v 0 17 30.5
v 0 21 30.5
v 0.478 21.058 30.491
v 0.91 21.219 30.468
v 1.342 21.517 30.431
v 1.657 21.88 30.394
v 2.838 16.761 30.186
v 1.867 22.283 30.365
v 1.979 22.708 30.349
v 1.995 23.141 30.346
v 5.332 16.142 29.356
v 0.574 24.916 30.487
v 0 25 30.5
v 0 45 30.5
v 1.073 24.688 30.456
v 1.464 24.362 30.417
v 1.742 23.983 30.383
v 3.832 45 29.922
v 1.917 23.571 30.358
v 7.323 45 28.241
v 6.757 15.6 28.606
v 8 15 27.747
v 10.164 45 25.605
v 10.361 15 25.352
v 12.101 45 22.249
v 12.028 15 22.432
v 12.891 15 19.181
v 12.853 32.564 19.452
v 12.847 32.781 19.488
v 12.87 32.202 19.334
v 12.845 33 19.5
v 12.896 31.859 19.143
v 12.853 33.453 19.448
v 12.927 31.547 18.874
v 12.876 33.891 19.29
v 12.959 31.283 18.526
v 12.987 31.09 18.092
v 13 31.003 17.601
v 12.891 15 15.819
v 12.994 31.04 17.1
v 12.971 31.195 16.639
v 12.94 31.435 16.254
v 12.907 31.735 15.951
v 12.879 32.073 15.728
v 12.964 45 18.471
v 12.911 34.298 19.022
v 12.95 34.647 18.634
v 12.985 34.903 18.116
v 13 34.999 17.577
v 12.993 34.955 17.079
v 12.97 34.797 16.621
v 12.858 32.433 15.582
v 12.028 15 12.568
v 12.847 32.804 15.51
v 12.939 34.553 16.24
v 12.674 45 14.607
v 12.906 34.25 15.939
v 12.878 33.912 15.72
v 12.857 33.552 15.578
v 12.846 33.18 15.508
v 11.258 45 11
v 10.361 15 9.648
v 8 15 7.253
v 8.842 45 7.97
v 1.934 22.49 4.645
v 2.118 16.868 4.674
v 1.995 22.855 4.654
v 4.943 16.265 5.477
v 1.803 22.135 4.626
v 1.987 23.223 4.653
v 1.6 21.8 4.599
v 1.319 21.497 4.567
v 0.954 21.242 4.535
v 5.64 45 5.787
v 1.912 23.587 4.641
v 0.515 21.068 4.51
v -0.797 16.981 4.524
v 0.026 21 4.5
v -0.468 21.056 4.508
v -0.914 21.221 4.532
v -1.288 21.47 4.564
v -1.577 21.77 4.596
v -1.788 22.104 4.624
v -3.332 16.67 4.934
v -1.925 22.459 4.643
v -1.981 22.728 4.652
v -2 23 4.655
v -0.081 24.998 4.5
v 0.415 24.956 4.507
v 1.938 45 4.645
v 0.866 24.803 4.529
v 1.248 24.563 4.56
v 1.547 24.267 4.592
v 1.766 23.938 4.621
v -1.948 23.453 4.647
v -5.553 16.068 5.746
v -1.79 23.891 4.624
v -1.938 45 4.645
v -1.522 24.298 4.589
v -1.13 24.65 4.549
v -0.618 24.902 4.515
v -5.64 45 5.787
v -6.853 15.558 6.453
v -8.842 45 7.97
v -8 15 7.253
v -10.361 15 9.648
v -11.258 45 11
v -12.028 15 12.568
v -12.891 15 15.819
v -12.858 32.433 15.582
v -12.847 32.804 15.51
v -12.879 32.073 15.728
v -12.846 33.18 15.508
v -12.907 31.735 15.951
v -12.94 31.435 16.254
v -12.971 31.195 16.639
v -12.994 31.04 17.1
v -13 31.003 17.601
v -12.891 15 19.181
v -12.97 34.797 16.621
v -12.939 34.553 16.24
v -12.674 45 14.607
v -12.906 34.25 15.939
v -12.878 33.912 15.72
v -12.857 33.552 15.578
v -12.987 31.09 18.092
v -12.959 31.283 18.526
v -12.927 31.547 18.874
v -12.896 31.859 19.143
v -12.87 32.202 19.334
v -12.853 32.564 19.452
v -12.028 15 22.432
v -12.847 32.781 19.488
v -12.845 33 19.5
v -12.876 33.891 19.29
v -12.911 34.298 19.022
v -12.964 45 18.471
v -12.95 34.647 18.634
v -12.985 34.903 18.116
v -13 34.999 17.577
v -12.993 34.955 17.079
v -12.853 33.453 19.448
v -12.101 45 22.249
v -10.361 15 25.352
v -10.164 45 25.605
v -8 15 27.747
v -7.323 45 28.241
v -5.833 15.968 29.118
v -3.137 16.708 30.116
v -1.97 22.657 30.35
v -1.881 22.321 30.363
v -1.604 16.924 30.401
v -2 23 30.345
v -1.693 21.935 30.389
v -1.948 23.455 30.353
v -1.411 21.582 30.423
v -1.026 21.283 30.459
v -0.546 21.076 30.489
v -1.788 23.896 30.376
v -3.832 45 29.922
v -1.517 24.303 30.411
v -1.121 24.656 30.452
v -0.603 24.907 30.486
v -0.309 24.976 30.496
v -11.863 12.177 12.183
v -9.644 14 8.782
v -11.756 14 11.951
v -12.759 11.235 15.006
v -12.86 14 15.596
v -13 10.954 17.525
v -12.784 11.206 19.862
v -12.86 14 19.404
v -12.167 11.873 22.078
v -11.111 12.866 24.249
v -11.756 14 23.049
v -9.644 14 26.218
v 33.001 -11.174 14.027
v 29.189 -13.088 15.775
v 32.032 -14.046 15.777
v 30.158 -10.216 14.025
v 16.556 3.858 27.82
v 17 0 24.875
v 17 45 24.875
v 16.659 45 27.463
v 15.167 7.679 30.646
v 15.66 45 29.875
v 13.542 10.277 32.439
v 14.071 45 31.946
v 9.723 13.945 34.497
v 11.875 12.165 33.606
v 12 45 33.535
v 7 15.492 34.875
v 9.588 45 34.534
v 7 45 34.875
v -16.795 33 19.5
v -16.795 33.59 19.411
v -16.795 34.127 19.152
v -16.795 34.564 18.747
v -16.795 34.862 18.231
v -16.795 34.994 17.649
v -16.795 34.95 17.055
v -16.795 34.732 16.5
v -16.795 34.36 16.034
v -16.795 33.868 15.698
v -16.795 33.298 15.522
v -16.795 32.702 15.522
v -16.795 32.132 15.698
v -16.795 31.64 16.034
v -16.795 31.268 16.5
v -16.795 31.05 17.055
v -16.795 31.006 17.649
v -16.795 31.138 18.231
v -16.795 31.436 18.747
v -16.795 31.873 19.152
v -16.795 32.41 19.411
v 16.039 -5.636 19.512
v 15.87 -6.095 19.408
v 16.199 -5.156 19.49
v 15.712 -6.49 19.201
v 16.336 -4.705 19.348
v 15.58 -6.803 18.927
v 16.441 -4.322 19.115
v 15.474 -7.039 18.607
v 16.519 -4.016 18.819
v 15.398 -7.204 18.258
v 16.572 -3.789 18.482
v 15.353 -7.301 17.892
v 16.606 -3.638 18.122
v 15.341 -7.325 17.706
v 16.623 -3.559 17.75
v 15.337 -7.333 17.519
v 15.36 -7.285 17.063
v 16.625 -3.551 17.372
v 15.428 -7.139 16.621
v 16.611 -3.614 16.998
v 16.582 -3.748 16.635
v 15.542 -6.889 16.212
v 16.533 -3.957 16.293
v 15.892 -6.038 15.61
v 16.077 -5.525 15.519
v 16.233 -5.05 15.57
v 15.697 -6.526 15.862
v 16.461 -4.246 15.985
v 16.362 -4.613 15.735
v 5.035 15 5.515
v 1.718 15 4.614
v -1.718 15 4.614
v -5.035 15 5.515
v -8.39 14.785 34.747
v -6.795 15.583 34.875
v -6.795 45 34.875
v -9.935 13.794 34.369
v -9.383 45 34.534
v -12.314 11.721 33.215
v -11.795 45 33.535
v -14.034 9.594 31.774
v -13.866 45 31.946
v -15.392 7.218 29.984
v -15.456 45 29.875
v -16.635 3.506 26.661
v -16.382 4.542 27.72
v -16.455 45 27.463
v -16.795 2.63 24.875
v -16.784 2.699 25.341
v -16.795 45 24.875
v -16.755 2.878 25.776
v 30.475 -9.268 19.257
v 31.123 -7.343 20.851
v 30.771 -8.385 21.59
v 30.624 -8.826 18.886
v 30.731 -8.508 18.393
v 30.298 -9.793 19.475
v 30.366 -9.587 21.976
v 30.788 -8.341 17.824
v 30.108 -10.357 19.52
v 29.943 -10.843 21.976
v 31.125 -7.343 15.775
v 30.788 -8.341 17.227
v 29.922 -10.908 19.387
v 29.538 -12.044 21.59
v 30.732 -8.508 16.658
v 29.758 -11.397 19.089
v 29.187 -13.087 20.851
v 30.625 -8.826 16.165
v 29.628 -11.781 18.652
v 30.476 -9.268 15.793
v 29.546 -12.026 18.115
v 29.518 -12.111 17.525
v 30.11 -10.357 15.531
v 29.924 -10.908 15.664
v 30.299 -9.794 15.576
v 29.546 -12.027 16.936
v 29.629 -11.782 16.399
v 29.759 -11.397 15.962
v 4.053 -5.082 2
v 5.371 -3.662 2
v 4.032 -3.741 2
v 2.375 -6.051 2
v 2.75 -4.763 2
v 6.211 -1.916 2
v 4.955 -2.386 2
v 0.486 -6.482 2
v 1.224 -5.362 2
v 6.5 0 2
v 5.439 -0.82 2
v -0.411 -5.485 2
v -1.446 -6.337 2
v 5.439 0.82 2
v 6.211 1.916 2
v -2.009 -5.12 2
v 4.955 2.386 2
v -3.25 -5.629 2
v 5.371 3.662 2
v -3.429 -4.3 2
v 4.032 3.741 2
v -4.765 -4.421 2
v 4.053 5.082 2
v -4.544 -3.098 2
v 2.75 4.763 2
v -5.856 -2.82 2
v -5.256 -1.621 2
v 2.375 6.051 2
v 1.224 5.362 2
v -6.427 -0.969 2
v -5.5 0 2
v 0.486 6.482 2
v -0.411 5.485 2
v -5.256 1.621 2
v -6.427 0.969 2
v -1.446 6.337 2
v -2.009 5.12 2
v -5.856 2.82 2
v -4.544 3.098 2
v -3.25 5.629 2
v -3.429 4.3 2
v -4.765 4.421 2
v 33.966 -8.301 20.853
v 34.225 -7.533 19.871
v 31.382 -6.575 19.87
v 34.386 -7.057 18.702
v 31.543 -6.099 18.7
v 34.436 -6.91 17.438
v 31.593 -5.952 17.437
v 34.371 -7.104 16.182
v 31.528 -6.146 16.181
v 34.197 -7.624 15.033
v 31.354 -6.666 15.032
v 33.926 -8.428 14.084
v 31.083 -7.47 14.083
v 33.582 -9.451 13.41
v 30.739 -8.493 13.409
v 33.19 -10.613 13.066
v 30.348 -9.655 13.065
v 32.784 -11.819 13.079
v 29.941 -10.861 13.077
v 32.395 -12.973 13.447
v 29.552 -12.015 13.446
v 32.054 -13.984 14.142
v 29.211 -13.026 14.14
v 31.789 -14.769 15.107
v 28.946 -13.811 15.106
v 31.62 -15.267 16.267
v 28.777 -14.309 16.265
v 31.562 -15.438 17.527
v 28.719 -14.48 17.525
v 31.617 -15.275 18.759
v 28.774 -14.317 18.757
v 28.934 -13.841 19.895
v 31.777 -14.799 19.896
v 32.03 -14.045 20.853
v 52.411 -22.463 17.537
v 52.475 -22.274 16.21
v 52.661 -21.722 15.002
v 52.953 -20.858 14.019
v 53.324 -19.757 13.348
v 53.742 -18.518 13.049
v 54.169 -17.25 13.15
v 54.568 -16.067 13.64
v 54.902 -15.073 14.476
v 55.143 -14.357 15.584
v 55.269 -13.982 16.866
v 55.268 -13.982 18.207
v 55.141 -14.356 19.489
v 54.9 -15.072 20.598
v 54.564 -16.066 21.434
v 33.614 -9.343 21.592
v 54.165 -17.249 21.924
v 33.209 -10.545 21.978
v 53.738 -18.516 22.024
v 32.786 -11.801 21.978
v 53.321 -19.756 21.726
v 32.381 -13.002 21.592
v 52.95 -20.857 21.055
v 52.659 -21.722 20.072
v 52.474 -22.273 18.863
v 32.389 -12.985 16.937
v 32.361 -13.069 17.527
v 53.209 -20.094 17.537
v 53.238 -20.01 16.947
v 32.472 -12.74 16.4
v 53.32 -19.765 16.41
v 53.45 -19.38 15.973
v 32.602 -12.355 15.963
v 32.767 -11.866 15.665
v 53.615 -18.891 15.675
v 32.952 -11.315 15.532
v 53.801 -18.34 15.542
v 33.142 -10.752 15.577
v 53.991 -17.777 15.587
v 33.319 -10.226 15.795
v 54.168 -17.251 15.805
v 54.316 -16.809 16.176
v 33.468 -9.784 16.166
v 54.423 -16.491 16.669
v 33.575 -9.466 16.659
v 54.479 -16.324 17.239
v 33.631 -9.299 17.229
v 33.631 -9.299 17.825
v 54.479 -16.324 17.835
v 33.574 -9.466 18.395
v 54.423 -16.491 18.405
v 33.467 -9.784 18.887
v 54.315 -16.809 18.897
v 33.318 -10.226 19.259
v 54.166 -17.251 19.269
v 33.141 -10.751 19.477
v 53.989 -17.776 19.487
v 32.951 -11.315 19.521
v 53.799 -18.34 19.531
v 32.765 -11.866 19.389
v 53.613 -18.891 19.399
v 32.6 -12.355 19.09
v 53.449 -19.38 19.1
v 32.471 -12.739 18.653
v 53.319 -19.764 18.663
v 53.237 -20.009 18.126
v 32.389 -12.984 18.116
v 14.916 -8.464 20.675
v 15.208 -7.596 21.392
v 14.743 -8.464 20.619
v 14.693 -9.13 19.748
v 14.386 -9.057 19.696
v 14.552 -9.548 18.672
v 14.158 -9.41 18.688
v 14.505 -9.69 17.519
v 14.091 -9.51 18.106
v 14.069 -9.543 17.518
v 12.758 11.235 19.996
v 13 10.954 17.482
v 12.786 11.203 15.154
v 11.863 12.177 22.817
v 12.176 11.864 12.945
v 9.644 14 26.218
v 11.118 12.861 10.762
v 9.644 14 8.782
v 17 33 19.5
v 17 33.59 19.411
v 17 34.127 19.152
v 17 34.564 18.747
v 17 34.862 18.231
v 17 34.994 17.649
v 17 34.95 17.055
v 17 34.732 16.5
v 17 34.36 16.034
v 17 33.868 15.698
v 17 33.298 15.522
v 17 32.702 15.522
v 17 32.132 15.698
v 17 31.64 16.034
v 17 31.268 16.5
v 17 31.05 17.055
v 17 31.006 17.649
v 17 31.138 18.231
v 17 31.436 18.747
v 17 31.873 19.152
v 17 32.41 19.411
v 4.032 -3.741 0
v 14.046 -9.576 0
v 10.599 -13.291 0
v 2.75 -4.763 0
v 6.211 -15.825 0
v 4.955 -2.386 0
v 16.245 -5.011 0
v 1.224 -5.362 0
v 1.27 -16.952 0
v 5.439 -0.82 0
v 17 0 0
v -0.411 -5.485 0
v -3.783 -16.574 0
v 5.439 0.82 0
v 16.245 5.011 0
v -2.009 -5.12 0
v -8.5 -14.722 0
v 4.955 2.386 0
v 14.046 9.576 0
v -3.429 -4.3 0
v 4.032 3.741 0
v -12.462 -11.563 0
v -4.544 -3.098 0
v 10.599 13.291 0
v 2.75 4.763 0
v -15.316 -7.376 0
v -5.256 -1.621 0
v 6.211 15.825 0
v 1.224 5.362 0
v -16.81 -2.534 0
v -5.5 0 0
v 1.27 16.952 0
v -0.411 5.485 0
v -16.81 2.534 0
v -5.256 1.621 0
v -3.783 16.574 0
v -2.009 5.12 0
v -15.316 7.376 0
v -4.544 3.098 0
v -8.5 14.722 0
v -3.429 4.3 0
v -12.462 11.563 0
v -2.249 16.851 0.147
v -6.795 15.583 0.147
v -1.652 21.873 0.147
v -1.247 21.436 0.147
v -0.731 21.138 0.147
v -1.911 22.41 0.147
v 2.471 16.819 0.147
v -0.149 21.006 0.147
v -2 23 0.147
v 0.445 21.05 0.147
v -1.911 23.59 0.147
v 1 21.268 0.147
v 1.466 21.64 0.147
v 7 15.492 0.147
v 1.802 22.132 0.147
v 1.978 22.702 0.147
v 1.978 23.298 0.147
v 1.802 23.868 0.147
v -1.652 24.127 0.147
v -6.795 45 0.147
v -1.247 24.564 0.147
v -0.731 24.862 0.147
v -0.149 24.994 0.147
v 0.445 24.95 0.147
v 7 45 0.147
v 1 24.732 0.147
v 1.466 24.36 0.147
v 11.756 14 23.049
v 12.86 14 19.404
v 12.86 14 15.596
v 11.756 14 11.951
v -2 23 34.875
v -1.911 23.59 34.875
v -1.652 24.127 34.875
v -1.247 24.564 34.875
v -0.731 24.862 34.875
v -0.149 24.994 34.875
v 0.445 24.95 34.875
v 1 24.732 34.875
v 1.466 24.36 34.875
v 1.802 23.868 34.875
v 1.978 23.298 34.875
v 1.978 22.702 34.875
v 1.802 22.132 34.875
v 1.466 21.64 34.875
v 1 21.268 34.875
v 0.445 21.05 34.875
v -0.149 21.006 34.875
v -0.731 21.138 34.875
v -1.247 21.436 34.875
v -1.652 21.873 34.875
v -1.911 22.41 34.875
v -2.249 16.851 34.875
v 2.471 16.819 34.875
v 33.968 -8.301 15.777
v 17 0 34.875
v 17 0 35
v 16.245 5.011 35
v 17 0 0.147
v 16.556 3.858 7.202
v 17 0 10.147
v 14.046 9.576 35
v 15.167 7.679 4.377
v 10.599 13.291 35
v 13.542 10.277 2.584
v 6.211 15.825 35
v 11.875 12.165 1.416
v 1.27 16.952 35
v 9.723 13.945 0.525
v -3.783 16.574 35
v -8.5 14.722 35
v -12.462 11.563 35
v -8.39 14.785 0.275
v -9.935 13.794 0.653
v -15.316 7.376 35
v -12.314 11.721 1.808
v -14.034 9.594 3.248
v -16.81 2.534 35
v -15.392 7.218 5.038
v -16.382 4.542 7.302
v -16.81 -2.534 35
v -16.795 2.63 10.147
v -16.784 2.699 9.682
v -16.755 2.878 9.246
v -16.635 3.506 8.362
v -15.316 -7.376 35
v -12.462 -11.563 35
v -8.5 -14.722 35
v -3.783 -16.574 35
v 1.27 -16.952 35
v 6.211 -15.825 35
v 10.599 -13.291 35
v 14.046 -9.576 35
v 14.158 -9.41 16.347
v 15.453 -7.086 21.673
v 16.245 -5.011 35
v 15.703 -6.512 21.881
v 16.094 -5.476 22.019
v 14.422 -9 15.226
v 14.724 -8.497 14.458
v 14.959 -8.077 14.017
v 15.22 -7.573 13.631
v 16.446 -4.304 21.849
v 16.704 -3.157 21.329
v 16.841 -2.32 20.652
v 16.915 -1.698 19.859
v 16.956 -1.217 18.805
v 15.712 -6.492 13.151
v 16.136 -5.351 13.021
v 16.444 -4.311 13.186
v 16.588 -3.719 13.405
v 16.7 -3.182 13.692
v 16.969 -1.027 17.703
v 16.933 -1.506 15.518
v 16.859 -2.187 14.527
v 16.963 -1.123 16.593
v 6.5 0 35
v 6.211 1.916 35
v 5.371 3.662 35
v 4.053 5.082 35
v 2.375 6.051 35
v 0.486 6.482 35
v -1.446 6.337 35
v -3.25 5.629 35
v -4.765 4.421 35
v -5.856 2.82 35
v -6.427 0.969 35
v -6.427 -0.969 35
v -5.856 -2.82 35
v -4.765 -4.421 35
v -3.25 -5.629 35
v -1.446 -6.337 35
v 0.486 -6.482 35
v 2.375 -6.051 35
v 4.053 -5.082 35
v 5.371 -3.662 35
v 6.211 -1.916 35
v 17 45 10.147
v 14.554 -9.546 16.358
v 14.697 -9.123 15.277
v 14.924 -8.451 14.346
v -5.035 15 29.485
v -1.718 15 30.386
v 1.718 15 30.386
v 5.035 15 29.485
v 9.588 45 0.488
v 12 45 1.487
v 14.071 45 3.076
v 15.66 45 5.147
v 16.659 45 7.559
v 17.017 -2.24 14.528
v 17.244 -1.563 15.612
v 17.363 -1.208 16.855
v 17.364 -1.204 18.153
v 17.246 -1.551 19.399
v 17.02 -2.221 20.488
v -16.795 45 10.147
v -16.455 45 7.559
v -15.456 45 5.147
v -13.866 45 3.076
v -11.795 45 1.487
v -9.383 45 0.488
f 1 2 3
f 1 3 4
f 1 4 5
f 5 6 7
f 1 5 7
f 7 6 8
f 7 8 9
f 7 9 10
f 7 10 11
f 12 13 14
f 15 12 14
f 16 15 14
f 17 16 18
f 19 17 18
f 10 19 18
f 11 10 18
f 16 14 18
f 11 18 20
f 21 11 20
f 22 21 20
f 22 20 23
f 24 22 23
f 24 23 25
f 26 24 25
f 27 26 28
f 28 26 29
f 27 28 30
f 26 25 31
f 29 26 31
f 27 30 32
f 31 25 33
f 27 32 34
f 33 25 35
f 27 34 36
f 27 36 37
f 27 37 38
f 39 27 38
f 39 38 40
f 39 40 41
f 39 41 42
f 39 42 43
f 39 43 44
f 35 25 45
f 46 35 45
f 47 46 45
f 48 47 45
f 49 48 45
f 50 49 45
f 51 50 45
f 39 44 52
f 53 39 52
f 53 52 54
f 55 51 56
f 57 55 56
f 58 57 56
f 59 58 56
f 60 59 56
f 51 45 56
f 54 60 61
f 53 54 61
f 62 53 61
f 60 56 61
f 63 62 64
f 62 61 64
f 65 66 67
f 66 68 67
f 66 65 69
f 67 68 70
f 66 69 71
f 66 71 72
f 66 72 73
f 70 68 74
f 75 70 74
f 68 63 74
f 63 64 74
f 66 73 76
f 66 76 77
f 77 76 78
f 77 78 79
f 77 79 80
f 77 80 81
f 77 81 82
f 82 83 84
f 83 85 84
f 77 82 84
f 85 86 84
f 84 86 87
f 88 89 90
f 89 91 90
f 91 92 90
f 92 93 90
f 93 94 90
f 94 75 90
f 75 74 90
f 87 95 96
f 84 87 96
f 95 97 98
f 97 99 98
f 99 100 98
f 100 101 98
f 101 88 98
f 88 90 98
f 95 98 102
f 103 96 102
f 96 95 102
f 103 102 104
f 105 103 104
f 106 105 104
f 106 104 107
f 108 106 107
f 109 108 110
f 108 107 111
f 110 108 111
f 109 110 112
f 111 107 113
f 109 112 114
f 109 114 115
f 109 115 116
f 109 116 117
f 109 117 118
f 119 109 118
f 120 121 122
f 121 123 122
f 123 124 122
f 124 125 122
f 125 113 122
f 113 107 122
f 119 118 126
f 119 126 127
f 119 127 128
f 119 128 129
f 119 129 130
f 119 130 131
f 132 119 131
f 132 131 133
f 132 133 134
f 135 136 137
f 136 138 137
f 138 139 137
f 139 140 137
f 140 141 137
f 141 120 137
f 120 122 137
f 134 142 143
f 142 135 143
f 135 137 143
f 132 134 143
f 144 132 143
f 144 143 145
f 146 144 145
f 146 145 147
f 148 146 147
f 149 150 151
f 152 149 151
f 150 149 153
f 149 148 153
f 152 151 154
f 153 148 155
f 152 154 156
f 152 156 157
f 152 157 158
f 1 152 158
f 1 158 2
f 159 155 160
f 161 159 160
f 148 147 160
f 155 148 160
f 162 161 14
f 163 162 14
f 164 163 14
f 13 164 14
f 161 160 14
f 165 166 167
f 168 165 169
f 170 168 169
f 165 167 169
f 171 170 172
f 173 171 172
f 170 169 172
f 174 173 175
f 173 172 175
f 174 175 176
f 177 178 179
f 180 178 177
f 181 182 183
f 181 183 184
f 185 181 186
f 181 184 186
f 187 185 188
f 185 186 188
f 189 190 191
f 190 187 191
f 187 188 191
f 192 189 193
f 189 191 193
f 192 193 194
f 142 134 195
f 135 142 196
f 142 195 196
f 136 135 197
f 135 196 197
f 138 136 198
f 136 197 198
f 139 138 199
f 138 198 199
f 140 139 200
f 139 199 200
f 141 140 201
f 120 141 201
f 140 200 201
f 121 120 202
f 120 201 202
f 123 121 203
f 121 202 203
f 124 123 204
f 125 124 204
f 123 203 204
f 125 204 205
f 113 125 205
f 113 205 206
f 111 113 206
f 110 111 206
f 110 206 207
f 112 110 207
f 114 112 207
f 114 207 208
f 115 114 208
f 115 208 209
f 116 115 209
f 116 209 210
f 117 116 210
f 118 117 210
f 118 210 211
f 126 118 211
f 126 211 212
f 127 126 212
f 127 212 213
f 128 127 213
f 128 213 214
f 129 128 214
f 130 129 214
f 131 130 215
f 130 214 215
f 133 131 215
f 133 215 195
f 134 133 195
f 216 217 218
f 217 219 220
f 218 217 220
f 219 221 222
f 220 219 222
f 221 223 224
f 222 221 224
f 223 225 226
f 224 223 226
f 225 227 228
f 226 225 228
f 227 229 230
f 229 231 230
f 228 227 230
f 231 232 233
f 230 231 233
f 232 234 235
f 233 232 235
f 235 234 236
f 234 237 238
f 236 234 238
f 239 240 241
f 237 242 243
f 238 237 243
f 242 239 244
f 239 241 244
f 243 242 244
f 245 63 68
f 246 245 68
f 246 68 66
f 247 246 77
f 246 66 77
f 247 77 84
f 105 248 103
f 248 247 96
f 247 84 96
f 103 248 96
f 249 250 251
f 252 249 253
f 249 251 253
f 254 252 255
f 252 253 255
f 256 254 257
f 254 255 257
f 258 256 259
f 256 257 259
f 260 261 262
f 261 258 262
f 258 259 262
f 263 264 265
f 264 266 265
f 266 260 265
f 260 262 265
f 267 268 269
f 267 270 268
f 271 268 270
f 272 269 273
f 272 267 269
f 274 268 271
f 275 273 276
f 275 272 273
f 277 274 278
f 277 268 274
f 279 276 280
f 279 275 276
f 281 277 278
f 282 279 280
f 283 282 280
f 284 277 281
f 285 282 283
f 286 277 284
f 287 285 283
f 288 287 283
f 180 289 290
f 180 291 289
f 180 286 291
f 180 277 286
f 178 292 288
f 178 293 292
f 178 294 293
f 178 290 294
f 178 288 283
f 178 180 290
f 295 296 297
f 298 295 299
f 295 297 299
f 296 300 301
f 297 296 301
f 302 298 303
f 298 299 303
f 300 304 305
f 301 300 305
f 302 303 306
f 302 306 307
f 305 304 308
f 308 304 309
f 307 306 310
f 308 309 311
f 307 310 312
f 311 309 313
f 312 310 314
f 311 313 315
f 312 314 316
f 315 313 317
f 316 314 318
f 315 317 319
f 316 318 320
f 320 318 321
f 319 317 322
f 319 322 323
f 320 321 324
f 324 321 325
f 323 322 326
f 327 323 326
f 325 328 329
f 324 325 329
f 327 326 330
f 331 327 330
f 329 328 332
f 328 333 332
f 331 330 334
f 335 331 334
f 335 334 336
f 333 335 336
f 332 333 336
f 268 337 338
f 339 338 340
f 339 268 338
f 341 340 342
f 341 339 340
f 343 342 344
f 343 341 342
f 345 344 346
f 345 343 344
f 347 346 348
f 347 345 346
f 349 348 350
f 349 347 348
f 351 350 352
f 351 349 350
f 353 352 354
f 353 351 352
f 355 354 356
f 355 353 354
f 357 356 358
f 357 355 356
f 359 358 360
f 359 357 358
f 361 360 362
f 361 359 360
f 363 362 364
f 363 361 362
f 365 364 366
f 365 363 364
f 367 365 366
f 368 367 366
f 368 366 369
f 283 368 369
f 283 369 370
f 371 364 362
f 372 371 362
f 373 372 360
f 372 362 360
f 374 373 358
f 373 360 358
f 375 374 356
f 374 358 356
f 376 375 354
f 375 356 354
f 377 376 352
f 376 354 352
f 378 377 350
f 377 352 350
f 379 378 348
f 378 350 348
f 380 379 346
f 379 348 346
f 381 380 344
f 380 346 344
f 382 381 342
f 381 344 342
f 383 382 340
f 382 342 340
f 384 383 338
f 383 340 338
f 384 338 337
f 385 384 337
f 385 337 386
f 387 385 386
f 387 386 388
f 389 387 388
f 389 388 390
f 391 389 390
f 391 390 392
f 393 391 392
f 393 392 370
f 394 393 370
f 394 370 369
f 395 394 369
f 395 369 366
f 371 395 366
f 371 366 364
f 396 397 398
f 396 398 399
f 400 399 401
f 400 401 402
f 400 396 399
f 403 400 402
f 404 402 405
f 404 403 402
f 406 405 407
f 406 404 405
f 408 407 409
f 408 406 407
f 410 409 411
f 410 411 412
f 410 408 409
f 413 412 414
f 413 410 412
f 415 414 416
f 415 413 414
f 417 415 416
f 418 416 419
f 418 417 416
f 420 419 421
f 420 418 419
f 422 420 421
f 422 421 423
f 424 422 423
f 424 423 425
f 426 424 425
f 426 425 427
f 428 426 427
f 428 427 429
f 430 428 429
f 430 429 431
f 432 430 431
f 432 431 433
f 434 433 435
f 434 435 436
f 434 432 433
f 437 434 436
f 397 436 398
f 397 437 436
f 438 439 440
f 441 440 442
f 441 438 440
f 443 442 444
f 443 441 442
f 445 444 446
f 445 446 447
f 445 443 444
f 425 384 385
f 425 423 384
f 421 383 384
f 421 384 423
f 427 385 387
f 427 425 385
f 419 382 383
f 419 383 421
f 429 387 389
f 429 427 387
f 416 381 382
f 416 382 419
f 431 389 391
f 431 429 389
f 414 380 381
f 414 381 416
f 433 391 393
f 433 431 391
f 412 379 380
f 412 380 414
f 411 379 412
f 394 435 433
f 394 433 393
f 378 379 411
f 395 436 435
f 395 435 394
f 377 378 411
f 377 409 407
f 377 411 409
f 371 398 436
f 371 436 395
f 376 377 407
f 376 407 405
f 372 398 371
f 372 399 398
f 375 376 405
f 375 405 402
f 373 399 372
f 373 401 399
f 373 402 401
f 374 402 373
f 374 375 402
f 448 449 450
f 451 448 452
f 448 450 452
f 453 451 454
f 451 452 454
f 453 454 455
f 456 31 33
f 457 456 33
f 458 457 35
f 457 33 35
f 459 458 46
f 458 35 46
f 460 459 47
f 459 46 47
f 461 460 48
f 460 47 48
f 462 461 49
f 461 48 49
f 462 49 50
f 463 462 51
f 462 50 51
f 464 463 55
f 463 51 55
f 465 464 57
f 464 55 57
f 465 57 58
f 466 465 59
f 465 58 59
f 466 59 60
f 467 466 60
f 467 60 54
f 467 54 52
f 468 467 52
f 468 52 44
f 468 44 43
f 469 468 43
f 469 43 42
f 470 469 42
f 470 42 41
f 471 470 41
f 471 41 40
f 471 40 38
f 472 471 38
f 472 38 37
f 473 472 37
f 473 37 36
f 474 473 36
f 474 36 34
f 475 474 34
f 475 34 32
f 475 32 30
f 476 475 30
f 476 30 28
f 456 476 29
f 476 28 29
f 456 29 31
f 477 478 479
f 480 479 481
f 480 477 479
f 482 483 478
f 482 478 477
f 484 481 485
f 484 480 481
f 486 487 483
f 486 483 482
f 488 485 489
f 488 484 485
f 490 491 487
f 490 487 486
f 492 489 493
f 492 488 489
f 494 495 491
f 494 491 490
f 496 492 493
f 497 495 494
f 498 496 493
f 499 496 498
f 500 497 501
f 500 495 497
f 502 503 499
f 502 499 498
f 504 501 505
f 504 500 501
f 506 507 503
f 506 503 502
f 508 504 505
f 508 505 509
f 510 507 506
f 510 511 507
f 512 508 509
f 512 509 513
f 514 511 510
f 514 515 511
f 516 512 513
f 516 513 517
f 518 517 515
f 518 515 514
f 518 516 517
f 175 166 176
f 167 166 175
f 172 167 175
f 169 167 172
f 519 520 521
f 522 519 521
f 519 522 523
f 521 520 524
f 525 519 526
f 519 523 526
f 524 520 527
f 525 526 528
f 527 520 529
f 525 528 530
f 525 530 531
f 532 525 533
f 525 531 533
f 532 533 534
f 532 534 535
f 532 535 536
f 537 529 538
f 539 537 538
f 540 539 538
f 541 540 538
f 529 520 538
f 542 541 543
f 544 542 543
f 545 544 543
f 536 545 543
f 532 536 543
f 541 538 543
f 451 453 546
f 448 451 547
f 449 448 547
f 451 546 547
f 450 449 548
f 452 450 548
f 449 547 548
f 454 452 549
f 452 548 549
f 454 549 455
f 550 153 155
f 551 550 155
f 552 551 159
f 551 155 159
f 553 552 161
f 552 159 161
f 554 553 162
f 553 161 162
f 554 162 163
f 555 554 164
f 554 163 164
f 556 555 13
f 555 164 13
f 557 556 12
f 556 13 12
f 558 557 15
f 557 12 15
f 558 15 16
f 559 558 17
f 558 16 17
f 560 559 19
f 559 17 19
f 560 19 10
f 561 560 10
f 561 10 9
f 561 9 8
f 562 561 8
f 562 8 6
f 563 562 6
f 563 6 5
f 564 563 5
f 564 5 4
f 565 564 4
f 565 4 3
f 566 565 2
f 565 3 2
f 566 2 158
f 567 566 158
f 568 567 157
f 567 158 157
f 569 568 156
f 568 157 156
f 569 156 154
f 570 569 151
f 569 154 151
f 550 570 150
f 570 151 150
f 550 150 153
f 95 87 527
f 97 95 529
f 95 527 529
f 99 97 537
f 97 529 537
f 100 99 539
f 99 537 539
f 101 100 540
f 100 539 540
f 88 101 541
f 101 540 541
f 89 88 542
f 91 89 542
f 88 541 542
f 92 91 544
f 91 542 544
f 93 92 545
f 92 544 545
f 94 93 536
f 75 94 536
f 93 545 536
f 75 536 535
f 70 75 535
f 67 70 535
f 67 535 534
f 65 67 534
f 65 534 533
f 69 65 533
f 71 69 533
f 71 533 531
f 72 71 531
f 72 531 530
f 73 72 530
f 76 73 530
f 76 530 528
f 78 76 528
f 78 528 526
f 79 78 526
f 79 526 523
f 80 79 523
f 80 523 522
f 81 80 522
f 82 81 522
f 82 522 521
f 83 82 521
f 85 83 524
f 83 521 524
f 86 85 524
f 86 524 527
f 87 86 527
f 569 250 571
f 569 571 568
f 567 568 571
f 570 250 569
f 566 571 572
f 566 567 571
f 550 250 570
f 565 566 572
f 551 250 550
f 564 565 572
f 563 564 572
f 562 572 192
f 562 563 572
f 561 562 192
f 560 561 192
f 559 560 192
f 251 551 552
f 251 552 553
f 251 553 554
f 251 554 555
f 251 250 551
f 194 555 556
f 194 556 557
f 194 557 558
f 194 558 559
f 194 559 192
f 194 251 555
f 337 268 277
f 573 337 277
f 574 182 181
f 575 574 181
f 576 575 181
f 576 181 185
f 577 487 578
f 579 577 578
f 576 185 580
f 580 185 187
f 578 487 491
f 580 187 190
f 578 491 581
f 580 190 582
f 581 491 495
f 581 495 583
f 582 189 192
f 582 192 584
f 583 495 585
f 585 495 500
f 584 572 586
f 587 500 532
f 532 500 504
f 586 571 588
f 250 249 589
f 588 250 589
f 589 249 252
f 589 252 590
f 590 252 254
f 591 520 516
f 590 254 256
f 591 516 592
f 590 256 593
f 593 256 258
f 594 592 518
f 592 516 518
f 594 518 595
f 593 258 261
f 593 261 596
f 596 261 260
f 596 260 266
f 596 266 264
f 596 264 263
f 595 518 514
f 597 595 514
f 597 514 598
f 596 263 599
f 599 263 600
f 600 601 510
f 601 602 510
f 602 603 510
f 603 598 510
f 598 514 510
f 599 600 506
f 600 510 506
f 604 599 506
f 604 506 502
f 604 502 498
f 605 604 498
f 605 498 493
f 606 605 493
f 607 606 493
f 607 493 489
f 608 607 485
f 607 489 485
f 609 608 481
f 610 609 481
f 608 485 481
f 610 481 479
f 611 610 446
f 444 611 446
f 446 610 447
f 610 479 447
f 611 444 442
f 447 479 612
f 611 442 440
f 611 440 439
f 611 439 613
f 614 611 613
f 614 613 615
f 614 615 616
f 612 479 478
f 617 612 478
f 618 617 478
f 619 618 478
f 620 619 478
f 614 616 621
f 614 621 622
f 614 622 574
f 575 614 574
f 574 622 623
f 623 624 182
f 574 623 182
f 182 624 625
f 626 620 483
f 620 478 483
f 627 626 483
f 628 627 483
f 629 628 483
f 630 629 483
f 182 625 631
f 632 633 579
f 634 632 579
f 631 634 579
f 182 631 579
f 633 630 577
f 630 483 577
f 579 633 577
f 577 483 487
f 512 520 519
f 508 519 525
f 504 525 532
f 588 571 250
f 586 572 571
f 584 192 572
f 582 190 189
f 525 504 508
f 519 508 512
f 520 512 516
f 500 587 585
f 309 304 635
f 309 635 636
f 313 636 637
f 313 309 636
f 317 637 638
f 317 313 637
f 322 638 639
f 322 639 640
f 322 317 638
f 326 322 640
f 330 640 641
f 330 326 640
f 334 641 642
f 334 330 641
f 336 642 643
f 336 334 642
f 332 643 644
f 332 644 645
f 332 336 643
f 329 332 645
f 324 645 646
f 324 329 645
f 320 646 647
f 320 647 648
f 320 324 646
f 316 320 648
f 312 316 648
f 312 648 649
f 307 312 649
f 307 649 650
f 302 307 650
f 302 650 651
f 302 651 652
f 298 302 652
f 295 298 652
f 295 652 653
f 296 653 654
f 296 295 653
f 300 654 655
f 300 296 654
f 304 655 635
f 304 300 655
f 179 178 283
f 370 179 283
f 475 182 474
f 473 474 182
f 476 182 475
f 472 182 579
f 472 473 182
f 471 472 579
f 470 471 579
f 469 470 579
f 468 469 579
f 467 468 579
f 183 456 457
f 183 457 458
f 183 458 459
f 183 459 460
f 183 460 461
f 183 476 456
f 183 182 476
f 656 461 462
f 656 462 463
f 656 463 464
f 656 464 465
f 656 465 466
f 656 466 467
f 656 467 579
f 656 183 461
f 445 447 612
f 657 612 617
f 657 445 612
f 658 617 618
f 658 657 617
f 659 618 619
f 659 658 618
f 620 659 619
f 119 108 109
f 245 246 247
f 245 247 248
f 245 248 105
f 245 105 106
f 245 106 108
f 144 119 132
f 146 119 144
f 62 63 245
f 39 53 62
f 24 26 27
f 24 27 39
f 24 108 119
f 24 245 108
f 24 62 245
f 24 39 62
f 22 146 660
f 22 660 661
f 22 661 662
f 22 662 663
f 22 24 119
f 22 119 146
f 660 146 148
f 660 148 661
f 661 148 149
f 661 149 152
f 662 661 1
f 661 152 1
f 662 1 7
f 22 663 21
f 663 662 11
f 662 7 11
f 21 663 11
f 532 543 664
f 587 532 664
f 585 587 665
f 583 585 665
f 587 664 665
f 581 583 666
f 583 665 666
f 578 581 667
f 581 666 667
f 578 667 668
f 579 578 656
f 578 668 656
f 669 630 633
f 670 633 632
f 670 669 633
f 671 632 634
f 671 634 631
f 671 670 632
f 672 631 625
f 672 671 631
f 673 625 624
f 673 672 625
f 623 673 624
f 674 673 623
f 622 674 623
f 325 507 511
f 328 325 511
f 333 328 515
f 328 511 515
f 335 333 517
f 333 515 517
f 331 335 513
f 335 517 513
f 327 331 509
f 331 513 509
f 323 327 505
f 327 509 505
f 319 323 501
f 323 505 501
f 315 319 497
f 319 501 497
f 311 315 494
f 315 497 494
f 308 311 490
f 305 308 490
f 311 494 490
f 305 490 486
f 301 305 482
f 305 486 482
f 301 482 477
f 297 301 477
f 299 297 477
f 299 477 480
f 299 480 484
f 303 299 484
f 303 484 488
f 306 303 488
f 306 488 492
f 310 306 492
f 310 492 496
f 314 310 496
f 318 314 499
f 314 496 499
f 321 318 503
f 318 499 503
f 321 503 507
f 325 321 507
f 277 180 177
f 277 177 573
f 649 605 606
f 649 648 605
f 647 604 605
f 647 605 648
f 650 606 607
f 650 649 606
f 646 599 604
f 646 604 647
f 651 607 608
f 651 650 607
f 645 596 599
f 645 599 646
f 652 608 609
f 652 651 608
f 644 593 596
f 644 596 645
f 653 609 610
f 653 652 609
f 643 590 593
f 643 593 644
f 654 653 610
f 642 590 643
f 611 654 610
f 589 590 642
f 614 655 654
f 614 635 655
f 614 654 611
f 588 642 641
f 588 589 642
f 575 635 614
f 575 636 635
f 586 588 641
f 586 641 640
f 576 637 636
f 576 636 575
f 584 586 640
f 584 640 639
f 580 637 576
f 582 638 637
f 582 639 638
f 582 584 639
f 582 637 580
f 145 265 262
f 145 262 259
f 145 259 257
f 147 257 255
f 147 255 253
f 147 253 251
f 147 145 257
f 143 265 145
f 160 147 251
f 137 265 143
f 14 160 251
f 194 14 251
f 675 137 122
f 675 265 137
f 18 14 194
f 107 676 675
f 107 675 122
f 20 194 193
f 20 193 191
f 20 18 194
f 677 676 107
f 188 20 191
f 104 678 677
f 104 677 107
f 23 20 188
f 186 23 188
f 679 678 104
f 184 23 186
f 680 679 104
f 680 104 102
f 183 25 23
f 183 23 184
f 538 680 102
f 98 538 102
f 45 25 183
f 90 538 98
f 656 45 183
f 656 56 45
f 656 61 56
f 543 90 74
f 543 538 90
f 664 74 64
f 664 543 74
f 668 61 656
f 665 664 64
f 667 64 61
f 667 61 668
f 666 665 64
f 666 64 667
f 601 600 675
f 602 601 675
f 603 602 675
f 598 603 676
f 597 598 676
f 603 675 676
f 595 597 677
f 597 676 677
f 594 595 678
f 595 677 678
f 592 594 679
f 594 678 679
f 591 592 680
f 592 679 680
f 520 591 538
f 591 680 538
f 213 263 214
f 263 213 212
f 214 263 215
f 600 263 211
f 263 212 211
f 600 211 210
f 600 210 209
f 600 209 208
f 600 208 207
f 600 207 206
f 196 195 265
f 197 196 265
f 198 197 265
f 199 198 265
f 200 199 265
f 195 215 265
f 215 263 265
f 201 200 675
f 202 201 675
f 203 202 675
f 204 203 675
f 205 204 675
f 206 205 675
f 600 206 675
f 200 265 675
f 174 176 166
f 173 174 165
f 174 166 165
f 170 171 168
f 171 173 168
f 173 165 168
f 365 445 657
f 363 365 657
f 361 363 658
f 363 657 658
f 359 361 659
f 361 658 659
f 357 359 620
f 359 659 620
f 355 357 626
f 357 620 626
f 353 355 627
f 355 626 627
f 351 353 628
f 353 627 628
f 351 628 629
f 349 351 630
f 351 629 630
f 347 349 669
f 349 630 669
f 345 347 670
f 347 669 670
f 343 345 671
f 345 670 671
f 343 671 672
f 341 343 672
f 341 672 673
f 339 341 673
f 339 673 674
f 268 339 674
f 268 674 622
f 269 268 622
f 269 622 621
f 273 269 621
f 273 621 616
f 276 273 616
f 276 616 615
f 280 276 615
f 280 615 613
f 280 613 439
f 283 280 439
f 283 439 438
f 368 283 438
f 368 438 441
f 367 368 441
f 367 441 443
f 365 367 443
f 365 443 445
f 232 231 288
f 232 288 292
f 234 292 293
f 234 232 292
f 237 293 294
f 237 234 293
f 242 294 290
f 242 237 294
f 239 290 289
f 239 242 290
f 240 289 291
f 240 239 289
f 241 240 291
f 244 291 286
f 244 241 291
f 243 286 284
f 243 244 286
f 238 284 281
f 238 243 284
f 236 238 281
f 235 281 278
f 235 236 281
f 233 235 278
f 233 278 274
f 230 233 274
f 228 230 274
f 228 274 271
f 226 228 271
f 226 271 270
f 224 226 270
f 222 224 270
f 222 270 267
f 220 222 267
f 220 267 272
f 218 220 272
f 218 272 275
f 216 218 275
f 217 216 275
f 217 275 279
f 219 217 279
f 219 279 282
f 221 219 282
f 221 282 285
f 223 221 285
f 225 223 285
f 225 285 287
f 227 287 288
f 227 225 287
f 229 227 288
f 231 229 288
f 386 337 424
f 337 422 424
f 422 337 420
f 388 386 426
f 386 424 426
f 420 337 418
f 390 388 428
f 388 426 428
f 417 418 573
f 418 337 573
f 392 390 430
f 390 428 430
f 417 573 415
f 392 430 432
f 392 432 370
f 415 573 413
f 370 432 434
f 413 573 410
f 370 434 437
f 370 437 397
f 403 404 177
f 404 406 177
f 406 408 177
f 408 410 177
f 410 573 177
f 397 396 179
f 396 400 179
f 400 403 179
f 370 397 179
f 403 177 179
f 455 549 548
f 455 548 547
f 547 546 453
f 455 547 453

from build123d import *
from build123d.topology import SkipClean

# Parameters (mm, degrees)
SKETCH_1_R                        = 17
SKETCH_1_R_2                      = 6.5
EXTRUDE_2_DEPTH                   = 35
SKETCH_3_W                        = 33.795275063
SKETCH_3_H                        = 34.72803434
SKETCH_3_R                        = 13
EXTRUDE_7_DEPTH                   = 45
SKETCH_4_R                        = 6.5
CUT_EXTRUDE_1_DEPTH               = 60.489495005
SKETCH_12_R                       = 2
CUT_EXTRUDE_11_DEPTH              = 45
SKETCH_15_R                       = 2
CUT_EXTRUDE_12_DEPTH              = 45
FILLET_4_R                        = 10
SKETCH_20_R                       = 13
CUT_EXTRUDE_18_DEPTH              = 31
EXTRUDE_START                     = 1
SKETCH_25_R                       = 13
EXTRUDE_10_DEPTH                  = 1
SKETCH_26_R                       = 6.5
SKETCH_26_R_2                     = 5.5
EXTRUDE_11_DEPTH                  = 2
SKETCH_36_R                       = 4.5
SKETCH_36_R_2                     = 2
EXTRUDE_17_DEPTH                  = 15
EXTRUDE_17_DIRECTION_2_REACH      = 71.637
EXTRUDE_17_DIRECTION_2_END_RADIUS = 17
EXTRUDE_18_DEPTH                  = 3
SKETCH_38_R                       = 4.5
SKETCH_38_R_2                     = 2
EXTRUDE_20_DEPTH                  = 22


with BuildPart() as part:
    # Эскиз1 → Бобышка-Вытянуть2 (new body)
    with BuildSketch(Plane.XY):
        Circle(SKETCH_1_R)
        Circle(SKETCH_1_R_2, mode=Mode.SUBTRACT)
    extrude(amount=EXTRUDE_2_DEPTH)

    # Эскиз3 → Бобышка-Вытянуть7 (add)
    with BuildSketch(Plane(origin=(0, 45, 0), x_dir=(1, 0, 0), z_dir=(0, 1, 0))):
        with Locations((0.102362468, -17.511098906)):
            Rectangle(SKETCH_3_W, SKETCH_3_H)
        with Locations(Location((0, -17.5, 0), (0, 0, 270))):
            Circle(SKETCH_3_R, mode=Mode.SUBTRACT)
    extrude(amount=-EXTRUDE_7_DEPTH)

    # Эскиз4 → Вырез-Вытянуть1 (cut, through all)
    with BuildSketch(Plane(origin=(0, 0, 0), x_dir=(-1, 0, 0), z_dir=(0, 0, -1))):
        with Locations(Location((0, 0, 0), (0, 0, 180))):
            Circle(SKETCH_4_R)
    extrude(amount=-CUT_EXTRUDE_1_DEPTH, mode=Mode.SUBTRACT)

    # Эскиз12 → Вырез-Вытянуть11 (cut)
    with BuildSketch(Plane(origin=(0, 0, 0), x_dir=(-1, 0, 0), z_dir=(0, 0, -1))):
        with Locations((0, 23)):
            Circle(SKETCH_12_R)
    extrude(amount=-CUT_EXTRUDE_11_DEPTH, mode=Mode.SUBTRACT)

    # Эскиз15 → Вырез-Вытянуть12 (cut)
    with BuildSketch(Plane.ZY.offset(16.795275063)):
        with Locations((17.5, 33)):
            Circle(SKETCH_15_R)
    extrude(amount=-CUT_EXTRUDE_12_DEPTH, mode=Mode.SUBTRACT)

    # Скругление4
    # the kernel refuses this fillet: 10 mm, written as the material it takes off along each edge
    with BuildSketch(Plane(origin=(-16.795275063, 70, 34.875116076), x_dir=(1, 0, 0), z_dir=(0, -1, 0))) as fillet_4_piece_1_section:
        with BuildLine():
            CenterArc((FILLET_4_R, -FILLET_4_R), FILLET_4_R, 90, 90)
            Line((0, -FILLET_4_R), (0, 0))
            Line((0, 0), (FILLET_4_R, 0))
        make_face()
    fillet_4_piece_1 = extrude(amount=92.369651061, mode=Mode.PRIVATE)
    fillet_4_piece_1 = fillet_4_piece_1 - Plane(origin=(0, 0, 32.54483178), x_dir=(1, 0, 0), z_dir=(0, 0, -1)) * Cylinder(17, 225, mode=Mode.PRIVATE)
    add(fillet_4_piece_1, mode=Mode.SUBTRACT)
    with BuildSketch(Plane(origin=(17, 70, 0.147081736), x_dir=(0, 0, 1), z_dir=(0, -1, 0))) as fillet_4_piece_2_section:
        with BuildLine():
            CenterArc((FILLET_4_R, FILLET_4_R), FILLET_4_R, 180, 90)
            Line((0, FILLET_4_R), (0, 0))
            Line((0, 0), (FILLET_4_R, 0))
        make_face()
    fillet_4_piece_2 = extrude(amount=95, mode=Mode.PRIVATE)
    fillet_4_piece_2 = fillet_4_piece_2 - Plane(origin=(0, 0, 2.486350956), x_dir=(1, 0, 0), z_dir=(0, 0, -1)) * Cylinder(17, 230, mode=Mode.PRIVATE)
    add(fillet_4_piece_2, mode=Mode.SUBTRACT)
    with BuildSketch(Plane(origin=(17, 70, 34.875116076), x_dir=(0, 0, -1), z_dir=(0, -1, 0))) as fillet_4_piece_3_section:
        with BuildLine():
            CenterArc((FILLET_4_R, -FILLET_4_R), FILLET_4_R, 90, 90)
            Line((0, -FILLET_4_R), (0, 0))
            Line((0, 0), (FILLET_4_R, 0))
        make_face()
    fillet_4_piece_3 = extrude(amount=95, mode=Mode.PRIVATE)
    fillet_4_piece_3 = fillet_4_piece_3 - Plane(origin=(0, 0, 32.535846855), x_dir=(1, 0, 0), z_dir=(0, 0, -1)) * Cylinder(17, 230, mode=Mode.PRIVATE)
    add(fillet_4_piece_3, mode=Mode.SUBTRACT)
    with BuildSketch(Plane(origin=(-16.795275063, 70, 0.147081736), x_dir=(0, 0, 1), z_dir=(0, -1, 0))) as fillet_4_piece_4_section:
        with BuildLine():
            CenterArc((FILLET_4_R, -FILLET_4_R), FILLET_4_R, 90, 90)
            Line((0, -FILLET_4_R), (0, 0))
            Line((0, 0), (FILLET_4_R, 0))
        make_face()
    fillet_4_piece_4 = extrude(amount=92.369651061, mode=Mode.PRIVATE)
    fillet_4_piece_4 = fillet_4_piece_4 - Plane(origin=(0, 0, 2.477367304), x_dir=(1, 0, 0), z_dir=(0, 0, -1)) * Cylinder(17, 225, mode=Mode.PRIVATE)
    add(fillet_4_piece_4, mode=Mode.SUBTRACT)

    # Эскиз20 → Вырез-Вытянуть18 (cut)
    with SkipClean():  # the faces are left unmerged after this step: merging them gives an invalid solid
        with BuildSketch(Plane(origin=(0, 45, 0), x_dir=(1, 0, 0), z_dir=(0, 1, 0))):
            with Locations(Location((0, -17.5, 0), (0, 0, 270))):
                Circle(SKETCH_20_R)
        extrude(amount=-CUT_EXTRUDE_18_DEPTH, mode=Mode.SUBTRACT)

    # Эскиз25 → Бобышка-Вытянуть10 (add)
    with BuildSketch(Plane(origin=(0, 14, 0), x_dir=(1, 0, 0), z_dir=(0, 1, 0)).offset(EXTRUDE_START)):
        with Locations(Location((0, -17.5, 0), (0, 0, 270))):
            Circle(SKETCH_25_R)
    extrude(amount=-EXTRUDE_10_DEPTH)

    # Эскиз26 → Бобышка-Вытянуть11 (add)
    with BuildSketch(Plane(origin=(0, 0, 0), x_dir=(-1, 0, 0), z_dir=(0, 0, -1))):
        Circle(SKETCH_26_R)
        Circle(SKETCH_26_R_2, mode=Mode.SUBTRACT)
    extrude(amount=-EXTRUDE_11_DEPTH)

    # Эскиз36 → Бобышка-Вытянуть17 (add)
    with BuildSketch(Plane(origin=(15.965526333, -5.379751182, 0.007630631), x_dir=(0.001361712962568806, 0.0026227730541390965, -0.9999956333901235), z_dir=(0.9476469847760447, -0.31931956893709296, 0.00045292239977668937))):
        with Locations(Location((-17.511098906, 0, 0), (0, 0, 269.832679764))):
            Circle(SKETCH_36_R)
        with Locations(Location((-17.511098906, 0, 0), (0, 0, 269.832679764))):
            Circle(SKETCH_36_R_2, mode=Mode.SUBTRACT)
    extrude(amount=EXTRUDE_17_DEPTH)

    # Бобышка-Вытянуть17 direction 2: up to this cylinder (the profile starts outside it)
    with SkipClean():  # the faces are left unmerged after this step: merging them gives an invalid solid
        extrude_17_direction_2_end = Plane(origin=(0, 0, 17.518653), z_dir=(0, 0, -1)) * Cylinder(EXTRUDE_17_DIRECTION_2_END_RADIUS, 178.274, mode=Mode.PRIVATE)
        # Эскиз36 → Бобышка-Вытянуть17 direction 2 (add, up to the surface)
        with BuildSketch(Plane(origin=(15.965526333, -5.379751182, 0.007630631), x_dir=(0.001361712962568806, 0.0026227730541390965, -0.9999956333901235), z_dir=(0.9476469847760447, -0.31931956893709296, 0.00045292239977668937)), mode=Mode.PRIVATE) as extrude_17_direction_2_sk1:
            with Locations(Location((-17.511098906, 0, 0), (0, 0, 269.832679764))):
                Circle(SKETCH_36_R)
            with Locations(Location((-17.511098906, 0, 0), (0, 0, 269.832679764))):
                Circle(SKETCH_36_R_2, mode=Mode.SUBTRACT)
        extrude_17_direction_2_tool1 = extrude(extrude_17_direction_2_sk1.sketch, amount=-EXTRUDE_17_DIRECTION_2_REACH, mode=Mode.PRIVATE) - extrude_17_direction_2_end
        add(extrude_17_direction_2_tool1.solids().sort_by_distance((17.337977, -1.281883, 17.518653))[0])
        add(extrude_17_direction_2_tool1.solids().sort_by_distance((17.337977, -1.281883, 17.518653))[1])

    # Эскиз37 → Бобышка-Вытянуть18 (add)
    with SkipClean():  # the faces are left unmerged after this step: merging them gives an invalid solid
        with BuildSketch(Plane(origin=(30.180231104, -10.169544716, 0.014424467), x_dir=(0.00042921059050976356, -0.00014462700029294434, -0.9999998974306447), z_dir=(0.9476469847760448, -0.31931956893709273, 0.0004529223997766894))):
            with BuildLine():
                Line((-19.261024238, 2.979951516), (-20.837057911, 2.979951516))
                ThreePointArc((-20.837057911, 2.979951516), (-13.011024238, -0.051137397), (-20.837057911, -3.08222631))
                Line((-20.837057911, -3.08222631), (-19.261024238, -3.08222631))
                Line((-19.261024238, -3.08222631), (-15.761024238, -3.08222631))
                Line((-15.761024238, -3.08222631), (-14.011024238, -0.051137397))
                Line((-14.011024238, -0.051137397), (-15.761024238, 2.979951516))
                Line((-15.761024238, 2.979951516), (-19.261024238, 2.979951516))
            make_face()
        extrude(amount=EXTRUDE_18_DEPTH)

    # Эскиз38 → Бобышка-Вытянуть20 (add)
    with SkipClean():  # the faces are left unmerged after this step: merging them gives an invalid solid
        with BuildSketch(Plane(origin=(33.023172059, -11.127503423, 0.015783234), x_dir=(0.0004292105905097637, -0.00014462700029294434, -0.9999998974306447), z_dir=(0.9476469847760447, -0.3193195689370928, 0.00045292239977668953))):
            with Locations(Location((-17.511024238, -0.051137397, 0), (0, 0, 270))):
                Circle(SKETCH_38_R)
            with Locations(Location((-17.511024238, -0.051137397, 0), (0, 0, 270))):
                Circle(SKETCH_38_R_2, mode=Mode.SUBTRACT)
        extrude(amount=EXTRUDE_20_DEPTH)


solid = part.part
